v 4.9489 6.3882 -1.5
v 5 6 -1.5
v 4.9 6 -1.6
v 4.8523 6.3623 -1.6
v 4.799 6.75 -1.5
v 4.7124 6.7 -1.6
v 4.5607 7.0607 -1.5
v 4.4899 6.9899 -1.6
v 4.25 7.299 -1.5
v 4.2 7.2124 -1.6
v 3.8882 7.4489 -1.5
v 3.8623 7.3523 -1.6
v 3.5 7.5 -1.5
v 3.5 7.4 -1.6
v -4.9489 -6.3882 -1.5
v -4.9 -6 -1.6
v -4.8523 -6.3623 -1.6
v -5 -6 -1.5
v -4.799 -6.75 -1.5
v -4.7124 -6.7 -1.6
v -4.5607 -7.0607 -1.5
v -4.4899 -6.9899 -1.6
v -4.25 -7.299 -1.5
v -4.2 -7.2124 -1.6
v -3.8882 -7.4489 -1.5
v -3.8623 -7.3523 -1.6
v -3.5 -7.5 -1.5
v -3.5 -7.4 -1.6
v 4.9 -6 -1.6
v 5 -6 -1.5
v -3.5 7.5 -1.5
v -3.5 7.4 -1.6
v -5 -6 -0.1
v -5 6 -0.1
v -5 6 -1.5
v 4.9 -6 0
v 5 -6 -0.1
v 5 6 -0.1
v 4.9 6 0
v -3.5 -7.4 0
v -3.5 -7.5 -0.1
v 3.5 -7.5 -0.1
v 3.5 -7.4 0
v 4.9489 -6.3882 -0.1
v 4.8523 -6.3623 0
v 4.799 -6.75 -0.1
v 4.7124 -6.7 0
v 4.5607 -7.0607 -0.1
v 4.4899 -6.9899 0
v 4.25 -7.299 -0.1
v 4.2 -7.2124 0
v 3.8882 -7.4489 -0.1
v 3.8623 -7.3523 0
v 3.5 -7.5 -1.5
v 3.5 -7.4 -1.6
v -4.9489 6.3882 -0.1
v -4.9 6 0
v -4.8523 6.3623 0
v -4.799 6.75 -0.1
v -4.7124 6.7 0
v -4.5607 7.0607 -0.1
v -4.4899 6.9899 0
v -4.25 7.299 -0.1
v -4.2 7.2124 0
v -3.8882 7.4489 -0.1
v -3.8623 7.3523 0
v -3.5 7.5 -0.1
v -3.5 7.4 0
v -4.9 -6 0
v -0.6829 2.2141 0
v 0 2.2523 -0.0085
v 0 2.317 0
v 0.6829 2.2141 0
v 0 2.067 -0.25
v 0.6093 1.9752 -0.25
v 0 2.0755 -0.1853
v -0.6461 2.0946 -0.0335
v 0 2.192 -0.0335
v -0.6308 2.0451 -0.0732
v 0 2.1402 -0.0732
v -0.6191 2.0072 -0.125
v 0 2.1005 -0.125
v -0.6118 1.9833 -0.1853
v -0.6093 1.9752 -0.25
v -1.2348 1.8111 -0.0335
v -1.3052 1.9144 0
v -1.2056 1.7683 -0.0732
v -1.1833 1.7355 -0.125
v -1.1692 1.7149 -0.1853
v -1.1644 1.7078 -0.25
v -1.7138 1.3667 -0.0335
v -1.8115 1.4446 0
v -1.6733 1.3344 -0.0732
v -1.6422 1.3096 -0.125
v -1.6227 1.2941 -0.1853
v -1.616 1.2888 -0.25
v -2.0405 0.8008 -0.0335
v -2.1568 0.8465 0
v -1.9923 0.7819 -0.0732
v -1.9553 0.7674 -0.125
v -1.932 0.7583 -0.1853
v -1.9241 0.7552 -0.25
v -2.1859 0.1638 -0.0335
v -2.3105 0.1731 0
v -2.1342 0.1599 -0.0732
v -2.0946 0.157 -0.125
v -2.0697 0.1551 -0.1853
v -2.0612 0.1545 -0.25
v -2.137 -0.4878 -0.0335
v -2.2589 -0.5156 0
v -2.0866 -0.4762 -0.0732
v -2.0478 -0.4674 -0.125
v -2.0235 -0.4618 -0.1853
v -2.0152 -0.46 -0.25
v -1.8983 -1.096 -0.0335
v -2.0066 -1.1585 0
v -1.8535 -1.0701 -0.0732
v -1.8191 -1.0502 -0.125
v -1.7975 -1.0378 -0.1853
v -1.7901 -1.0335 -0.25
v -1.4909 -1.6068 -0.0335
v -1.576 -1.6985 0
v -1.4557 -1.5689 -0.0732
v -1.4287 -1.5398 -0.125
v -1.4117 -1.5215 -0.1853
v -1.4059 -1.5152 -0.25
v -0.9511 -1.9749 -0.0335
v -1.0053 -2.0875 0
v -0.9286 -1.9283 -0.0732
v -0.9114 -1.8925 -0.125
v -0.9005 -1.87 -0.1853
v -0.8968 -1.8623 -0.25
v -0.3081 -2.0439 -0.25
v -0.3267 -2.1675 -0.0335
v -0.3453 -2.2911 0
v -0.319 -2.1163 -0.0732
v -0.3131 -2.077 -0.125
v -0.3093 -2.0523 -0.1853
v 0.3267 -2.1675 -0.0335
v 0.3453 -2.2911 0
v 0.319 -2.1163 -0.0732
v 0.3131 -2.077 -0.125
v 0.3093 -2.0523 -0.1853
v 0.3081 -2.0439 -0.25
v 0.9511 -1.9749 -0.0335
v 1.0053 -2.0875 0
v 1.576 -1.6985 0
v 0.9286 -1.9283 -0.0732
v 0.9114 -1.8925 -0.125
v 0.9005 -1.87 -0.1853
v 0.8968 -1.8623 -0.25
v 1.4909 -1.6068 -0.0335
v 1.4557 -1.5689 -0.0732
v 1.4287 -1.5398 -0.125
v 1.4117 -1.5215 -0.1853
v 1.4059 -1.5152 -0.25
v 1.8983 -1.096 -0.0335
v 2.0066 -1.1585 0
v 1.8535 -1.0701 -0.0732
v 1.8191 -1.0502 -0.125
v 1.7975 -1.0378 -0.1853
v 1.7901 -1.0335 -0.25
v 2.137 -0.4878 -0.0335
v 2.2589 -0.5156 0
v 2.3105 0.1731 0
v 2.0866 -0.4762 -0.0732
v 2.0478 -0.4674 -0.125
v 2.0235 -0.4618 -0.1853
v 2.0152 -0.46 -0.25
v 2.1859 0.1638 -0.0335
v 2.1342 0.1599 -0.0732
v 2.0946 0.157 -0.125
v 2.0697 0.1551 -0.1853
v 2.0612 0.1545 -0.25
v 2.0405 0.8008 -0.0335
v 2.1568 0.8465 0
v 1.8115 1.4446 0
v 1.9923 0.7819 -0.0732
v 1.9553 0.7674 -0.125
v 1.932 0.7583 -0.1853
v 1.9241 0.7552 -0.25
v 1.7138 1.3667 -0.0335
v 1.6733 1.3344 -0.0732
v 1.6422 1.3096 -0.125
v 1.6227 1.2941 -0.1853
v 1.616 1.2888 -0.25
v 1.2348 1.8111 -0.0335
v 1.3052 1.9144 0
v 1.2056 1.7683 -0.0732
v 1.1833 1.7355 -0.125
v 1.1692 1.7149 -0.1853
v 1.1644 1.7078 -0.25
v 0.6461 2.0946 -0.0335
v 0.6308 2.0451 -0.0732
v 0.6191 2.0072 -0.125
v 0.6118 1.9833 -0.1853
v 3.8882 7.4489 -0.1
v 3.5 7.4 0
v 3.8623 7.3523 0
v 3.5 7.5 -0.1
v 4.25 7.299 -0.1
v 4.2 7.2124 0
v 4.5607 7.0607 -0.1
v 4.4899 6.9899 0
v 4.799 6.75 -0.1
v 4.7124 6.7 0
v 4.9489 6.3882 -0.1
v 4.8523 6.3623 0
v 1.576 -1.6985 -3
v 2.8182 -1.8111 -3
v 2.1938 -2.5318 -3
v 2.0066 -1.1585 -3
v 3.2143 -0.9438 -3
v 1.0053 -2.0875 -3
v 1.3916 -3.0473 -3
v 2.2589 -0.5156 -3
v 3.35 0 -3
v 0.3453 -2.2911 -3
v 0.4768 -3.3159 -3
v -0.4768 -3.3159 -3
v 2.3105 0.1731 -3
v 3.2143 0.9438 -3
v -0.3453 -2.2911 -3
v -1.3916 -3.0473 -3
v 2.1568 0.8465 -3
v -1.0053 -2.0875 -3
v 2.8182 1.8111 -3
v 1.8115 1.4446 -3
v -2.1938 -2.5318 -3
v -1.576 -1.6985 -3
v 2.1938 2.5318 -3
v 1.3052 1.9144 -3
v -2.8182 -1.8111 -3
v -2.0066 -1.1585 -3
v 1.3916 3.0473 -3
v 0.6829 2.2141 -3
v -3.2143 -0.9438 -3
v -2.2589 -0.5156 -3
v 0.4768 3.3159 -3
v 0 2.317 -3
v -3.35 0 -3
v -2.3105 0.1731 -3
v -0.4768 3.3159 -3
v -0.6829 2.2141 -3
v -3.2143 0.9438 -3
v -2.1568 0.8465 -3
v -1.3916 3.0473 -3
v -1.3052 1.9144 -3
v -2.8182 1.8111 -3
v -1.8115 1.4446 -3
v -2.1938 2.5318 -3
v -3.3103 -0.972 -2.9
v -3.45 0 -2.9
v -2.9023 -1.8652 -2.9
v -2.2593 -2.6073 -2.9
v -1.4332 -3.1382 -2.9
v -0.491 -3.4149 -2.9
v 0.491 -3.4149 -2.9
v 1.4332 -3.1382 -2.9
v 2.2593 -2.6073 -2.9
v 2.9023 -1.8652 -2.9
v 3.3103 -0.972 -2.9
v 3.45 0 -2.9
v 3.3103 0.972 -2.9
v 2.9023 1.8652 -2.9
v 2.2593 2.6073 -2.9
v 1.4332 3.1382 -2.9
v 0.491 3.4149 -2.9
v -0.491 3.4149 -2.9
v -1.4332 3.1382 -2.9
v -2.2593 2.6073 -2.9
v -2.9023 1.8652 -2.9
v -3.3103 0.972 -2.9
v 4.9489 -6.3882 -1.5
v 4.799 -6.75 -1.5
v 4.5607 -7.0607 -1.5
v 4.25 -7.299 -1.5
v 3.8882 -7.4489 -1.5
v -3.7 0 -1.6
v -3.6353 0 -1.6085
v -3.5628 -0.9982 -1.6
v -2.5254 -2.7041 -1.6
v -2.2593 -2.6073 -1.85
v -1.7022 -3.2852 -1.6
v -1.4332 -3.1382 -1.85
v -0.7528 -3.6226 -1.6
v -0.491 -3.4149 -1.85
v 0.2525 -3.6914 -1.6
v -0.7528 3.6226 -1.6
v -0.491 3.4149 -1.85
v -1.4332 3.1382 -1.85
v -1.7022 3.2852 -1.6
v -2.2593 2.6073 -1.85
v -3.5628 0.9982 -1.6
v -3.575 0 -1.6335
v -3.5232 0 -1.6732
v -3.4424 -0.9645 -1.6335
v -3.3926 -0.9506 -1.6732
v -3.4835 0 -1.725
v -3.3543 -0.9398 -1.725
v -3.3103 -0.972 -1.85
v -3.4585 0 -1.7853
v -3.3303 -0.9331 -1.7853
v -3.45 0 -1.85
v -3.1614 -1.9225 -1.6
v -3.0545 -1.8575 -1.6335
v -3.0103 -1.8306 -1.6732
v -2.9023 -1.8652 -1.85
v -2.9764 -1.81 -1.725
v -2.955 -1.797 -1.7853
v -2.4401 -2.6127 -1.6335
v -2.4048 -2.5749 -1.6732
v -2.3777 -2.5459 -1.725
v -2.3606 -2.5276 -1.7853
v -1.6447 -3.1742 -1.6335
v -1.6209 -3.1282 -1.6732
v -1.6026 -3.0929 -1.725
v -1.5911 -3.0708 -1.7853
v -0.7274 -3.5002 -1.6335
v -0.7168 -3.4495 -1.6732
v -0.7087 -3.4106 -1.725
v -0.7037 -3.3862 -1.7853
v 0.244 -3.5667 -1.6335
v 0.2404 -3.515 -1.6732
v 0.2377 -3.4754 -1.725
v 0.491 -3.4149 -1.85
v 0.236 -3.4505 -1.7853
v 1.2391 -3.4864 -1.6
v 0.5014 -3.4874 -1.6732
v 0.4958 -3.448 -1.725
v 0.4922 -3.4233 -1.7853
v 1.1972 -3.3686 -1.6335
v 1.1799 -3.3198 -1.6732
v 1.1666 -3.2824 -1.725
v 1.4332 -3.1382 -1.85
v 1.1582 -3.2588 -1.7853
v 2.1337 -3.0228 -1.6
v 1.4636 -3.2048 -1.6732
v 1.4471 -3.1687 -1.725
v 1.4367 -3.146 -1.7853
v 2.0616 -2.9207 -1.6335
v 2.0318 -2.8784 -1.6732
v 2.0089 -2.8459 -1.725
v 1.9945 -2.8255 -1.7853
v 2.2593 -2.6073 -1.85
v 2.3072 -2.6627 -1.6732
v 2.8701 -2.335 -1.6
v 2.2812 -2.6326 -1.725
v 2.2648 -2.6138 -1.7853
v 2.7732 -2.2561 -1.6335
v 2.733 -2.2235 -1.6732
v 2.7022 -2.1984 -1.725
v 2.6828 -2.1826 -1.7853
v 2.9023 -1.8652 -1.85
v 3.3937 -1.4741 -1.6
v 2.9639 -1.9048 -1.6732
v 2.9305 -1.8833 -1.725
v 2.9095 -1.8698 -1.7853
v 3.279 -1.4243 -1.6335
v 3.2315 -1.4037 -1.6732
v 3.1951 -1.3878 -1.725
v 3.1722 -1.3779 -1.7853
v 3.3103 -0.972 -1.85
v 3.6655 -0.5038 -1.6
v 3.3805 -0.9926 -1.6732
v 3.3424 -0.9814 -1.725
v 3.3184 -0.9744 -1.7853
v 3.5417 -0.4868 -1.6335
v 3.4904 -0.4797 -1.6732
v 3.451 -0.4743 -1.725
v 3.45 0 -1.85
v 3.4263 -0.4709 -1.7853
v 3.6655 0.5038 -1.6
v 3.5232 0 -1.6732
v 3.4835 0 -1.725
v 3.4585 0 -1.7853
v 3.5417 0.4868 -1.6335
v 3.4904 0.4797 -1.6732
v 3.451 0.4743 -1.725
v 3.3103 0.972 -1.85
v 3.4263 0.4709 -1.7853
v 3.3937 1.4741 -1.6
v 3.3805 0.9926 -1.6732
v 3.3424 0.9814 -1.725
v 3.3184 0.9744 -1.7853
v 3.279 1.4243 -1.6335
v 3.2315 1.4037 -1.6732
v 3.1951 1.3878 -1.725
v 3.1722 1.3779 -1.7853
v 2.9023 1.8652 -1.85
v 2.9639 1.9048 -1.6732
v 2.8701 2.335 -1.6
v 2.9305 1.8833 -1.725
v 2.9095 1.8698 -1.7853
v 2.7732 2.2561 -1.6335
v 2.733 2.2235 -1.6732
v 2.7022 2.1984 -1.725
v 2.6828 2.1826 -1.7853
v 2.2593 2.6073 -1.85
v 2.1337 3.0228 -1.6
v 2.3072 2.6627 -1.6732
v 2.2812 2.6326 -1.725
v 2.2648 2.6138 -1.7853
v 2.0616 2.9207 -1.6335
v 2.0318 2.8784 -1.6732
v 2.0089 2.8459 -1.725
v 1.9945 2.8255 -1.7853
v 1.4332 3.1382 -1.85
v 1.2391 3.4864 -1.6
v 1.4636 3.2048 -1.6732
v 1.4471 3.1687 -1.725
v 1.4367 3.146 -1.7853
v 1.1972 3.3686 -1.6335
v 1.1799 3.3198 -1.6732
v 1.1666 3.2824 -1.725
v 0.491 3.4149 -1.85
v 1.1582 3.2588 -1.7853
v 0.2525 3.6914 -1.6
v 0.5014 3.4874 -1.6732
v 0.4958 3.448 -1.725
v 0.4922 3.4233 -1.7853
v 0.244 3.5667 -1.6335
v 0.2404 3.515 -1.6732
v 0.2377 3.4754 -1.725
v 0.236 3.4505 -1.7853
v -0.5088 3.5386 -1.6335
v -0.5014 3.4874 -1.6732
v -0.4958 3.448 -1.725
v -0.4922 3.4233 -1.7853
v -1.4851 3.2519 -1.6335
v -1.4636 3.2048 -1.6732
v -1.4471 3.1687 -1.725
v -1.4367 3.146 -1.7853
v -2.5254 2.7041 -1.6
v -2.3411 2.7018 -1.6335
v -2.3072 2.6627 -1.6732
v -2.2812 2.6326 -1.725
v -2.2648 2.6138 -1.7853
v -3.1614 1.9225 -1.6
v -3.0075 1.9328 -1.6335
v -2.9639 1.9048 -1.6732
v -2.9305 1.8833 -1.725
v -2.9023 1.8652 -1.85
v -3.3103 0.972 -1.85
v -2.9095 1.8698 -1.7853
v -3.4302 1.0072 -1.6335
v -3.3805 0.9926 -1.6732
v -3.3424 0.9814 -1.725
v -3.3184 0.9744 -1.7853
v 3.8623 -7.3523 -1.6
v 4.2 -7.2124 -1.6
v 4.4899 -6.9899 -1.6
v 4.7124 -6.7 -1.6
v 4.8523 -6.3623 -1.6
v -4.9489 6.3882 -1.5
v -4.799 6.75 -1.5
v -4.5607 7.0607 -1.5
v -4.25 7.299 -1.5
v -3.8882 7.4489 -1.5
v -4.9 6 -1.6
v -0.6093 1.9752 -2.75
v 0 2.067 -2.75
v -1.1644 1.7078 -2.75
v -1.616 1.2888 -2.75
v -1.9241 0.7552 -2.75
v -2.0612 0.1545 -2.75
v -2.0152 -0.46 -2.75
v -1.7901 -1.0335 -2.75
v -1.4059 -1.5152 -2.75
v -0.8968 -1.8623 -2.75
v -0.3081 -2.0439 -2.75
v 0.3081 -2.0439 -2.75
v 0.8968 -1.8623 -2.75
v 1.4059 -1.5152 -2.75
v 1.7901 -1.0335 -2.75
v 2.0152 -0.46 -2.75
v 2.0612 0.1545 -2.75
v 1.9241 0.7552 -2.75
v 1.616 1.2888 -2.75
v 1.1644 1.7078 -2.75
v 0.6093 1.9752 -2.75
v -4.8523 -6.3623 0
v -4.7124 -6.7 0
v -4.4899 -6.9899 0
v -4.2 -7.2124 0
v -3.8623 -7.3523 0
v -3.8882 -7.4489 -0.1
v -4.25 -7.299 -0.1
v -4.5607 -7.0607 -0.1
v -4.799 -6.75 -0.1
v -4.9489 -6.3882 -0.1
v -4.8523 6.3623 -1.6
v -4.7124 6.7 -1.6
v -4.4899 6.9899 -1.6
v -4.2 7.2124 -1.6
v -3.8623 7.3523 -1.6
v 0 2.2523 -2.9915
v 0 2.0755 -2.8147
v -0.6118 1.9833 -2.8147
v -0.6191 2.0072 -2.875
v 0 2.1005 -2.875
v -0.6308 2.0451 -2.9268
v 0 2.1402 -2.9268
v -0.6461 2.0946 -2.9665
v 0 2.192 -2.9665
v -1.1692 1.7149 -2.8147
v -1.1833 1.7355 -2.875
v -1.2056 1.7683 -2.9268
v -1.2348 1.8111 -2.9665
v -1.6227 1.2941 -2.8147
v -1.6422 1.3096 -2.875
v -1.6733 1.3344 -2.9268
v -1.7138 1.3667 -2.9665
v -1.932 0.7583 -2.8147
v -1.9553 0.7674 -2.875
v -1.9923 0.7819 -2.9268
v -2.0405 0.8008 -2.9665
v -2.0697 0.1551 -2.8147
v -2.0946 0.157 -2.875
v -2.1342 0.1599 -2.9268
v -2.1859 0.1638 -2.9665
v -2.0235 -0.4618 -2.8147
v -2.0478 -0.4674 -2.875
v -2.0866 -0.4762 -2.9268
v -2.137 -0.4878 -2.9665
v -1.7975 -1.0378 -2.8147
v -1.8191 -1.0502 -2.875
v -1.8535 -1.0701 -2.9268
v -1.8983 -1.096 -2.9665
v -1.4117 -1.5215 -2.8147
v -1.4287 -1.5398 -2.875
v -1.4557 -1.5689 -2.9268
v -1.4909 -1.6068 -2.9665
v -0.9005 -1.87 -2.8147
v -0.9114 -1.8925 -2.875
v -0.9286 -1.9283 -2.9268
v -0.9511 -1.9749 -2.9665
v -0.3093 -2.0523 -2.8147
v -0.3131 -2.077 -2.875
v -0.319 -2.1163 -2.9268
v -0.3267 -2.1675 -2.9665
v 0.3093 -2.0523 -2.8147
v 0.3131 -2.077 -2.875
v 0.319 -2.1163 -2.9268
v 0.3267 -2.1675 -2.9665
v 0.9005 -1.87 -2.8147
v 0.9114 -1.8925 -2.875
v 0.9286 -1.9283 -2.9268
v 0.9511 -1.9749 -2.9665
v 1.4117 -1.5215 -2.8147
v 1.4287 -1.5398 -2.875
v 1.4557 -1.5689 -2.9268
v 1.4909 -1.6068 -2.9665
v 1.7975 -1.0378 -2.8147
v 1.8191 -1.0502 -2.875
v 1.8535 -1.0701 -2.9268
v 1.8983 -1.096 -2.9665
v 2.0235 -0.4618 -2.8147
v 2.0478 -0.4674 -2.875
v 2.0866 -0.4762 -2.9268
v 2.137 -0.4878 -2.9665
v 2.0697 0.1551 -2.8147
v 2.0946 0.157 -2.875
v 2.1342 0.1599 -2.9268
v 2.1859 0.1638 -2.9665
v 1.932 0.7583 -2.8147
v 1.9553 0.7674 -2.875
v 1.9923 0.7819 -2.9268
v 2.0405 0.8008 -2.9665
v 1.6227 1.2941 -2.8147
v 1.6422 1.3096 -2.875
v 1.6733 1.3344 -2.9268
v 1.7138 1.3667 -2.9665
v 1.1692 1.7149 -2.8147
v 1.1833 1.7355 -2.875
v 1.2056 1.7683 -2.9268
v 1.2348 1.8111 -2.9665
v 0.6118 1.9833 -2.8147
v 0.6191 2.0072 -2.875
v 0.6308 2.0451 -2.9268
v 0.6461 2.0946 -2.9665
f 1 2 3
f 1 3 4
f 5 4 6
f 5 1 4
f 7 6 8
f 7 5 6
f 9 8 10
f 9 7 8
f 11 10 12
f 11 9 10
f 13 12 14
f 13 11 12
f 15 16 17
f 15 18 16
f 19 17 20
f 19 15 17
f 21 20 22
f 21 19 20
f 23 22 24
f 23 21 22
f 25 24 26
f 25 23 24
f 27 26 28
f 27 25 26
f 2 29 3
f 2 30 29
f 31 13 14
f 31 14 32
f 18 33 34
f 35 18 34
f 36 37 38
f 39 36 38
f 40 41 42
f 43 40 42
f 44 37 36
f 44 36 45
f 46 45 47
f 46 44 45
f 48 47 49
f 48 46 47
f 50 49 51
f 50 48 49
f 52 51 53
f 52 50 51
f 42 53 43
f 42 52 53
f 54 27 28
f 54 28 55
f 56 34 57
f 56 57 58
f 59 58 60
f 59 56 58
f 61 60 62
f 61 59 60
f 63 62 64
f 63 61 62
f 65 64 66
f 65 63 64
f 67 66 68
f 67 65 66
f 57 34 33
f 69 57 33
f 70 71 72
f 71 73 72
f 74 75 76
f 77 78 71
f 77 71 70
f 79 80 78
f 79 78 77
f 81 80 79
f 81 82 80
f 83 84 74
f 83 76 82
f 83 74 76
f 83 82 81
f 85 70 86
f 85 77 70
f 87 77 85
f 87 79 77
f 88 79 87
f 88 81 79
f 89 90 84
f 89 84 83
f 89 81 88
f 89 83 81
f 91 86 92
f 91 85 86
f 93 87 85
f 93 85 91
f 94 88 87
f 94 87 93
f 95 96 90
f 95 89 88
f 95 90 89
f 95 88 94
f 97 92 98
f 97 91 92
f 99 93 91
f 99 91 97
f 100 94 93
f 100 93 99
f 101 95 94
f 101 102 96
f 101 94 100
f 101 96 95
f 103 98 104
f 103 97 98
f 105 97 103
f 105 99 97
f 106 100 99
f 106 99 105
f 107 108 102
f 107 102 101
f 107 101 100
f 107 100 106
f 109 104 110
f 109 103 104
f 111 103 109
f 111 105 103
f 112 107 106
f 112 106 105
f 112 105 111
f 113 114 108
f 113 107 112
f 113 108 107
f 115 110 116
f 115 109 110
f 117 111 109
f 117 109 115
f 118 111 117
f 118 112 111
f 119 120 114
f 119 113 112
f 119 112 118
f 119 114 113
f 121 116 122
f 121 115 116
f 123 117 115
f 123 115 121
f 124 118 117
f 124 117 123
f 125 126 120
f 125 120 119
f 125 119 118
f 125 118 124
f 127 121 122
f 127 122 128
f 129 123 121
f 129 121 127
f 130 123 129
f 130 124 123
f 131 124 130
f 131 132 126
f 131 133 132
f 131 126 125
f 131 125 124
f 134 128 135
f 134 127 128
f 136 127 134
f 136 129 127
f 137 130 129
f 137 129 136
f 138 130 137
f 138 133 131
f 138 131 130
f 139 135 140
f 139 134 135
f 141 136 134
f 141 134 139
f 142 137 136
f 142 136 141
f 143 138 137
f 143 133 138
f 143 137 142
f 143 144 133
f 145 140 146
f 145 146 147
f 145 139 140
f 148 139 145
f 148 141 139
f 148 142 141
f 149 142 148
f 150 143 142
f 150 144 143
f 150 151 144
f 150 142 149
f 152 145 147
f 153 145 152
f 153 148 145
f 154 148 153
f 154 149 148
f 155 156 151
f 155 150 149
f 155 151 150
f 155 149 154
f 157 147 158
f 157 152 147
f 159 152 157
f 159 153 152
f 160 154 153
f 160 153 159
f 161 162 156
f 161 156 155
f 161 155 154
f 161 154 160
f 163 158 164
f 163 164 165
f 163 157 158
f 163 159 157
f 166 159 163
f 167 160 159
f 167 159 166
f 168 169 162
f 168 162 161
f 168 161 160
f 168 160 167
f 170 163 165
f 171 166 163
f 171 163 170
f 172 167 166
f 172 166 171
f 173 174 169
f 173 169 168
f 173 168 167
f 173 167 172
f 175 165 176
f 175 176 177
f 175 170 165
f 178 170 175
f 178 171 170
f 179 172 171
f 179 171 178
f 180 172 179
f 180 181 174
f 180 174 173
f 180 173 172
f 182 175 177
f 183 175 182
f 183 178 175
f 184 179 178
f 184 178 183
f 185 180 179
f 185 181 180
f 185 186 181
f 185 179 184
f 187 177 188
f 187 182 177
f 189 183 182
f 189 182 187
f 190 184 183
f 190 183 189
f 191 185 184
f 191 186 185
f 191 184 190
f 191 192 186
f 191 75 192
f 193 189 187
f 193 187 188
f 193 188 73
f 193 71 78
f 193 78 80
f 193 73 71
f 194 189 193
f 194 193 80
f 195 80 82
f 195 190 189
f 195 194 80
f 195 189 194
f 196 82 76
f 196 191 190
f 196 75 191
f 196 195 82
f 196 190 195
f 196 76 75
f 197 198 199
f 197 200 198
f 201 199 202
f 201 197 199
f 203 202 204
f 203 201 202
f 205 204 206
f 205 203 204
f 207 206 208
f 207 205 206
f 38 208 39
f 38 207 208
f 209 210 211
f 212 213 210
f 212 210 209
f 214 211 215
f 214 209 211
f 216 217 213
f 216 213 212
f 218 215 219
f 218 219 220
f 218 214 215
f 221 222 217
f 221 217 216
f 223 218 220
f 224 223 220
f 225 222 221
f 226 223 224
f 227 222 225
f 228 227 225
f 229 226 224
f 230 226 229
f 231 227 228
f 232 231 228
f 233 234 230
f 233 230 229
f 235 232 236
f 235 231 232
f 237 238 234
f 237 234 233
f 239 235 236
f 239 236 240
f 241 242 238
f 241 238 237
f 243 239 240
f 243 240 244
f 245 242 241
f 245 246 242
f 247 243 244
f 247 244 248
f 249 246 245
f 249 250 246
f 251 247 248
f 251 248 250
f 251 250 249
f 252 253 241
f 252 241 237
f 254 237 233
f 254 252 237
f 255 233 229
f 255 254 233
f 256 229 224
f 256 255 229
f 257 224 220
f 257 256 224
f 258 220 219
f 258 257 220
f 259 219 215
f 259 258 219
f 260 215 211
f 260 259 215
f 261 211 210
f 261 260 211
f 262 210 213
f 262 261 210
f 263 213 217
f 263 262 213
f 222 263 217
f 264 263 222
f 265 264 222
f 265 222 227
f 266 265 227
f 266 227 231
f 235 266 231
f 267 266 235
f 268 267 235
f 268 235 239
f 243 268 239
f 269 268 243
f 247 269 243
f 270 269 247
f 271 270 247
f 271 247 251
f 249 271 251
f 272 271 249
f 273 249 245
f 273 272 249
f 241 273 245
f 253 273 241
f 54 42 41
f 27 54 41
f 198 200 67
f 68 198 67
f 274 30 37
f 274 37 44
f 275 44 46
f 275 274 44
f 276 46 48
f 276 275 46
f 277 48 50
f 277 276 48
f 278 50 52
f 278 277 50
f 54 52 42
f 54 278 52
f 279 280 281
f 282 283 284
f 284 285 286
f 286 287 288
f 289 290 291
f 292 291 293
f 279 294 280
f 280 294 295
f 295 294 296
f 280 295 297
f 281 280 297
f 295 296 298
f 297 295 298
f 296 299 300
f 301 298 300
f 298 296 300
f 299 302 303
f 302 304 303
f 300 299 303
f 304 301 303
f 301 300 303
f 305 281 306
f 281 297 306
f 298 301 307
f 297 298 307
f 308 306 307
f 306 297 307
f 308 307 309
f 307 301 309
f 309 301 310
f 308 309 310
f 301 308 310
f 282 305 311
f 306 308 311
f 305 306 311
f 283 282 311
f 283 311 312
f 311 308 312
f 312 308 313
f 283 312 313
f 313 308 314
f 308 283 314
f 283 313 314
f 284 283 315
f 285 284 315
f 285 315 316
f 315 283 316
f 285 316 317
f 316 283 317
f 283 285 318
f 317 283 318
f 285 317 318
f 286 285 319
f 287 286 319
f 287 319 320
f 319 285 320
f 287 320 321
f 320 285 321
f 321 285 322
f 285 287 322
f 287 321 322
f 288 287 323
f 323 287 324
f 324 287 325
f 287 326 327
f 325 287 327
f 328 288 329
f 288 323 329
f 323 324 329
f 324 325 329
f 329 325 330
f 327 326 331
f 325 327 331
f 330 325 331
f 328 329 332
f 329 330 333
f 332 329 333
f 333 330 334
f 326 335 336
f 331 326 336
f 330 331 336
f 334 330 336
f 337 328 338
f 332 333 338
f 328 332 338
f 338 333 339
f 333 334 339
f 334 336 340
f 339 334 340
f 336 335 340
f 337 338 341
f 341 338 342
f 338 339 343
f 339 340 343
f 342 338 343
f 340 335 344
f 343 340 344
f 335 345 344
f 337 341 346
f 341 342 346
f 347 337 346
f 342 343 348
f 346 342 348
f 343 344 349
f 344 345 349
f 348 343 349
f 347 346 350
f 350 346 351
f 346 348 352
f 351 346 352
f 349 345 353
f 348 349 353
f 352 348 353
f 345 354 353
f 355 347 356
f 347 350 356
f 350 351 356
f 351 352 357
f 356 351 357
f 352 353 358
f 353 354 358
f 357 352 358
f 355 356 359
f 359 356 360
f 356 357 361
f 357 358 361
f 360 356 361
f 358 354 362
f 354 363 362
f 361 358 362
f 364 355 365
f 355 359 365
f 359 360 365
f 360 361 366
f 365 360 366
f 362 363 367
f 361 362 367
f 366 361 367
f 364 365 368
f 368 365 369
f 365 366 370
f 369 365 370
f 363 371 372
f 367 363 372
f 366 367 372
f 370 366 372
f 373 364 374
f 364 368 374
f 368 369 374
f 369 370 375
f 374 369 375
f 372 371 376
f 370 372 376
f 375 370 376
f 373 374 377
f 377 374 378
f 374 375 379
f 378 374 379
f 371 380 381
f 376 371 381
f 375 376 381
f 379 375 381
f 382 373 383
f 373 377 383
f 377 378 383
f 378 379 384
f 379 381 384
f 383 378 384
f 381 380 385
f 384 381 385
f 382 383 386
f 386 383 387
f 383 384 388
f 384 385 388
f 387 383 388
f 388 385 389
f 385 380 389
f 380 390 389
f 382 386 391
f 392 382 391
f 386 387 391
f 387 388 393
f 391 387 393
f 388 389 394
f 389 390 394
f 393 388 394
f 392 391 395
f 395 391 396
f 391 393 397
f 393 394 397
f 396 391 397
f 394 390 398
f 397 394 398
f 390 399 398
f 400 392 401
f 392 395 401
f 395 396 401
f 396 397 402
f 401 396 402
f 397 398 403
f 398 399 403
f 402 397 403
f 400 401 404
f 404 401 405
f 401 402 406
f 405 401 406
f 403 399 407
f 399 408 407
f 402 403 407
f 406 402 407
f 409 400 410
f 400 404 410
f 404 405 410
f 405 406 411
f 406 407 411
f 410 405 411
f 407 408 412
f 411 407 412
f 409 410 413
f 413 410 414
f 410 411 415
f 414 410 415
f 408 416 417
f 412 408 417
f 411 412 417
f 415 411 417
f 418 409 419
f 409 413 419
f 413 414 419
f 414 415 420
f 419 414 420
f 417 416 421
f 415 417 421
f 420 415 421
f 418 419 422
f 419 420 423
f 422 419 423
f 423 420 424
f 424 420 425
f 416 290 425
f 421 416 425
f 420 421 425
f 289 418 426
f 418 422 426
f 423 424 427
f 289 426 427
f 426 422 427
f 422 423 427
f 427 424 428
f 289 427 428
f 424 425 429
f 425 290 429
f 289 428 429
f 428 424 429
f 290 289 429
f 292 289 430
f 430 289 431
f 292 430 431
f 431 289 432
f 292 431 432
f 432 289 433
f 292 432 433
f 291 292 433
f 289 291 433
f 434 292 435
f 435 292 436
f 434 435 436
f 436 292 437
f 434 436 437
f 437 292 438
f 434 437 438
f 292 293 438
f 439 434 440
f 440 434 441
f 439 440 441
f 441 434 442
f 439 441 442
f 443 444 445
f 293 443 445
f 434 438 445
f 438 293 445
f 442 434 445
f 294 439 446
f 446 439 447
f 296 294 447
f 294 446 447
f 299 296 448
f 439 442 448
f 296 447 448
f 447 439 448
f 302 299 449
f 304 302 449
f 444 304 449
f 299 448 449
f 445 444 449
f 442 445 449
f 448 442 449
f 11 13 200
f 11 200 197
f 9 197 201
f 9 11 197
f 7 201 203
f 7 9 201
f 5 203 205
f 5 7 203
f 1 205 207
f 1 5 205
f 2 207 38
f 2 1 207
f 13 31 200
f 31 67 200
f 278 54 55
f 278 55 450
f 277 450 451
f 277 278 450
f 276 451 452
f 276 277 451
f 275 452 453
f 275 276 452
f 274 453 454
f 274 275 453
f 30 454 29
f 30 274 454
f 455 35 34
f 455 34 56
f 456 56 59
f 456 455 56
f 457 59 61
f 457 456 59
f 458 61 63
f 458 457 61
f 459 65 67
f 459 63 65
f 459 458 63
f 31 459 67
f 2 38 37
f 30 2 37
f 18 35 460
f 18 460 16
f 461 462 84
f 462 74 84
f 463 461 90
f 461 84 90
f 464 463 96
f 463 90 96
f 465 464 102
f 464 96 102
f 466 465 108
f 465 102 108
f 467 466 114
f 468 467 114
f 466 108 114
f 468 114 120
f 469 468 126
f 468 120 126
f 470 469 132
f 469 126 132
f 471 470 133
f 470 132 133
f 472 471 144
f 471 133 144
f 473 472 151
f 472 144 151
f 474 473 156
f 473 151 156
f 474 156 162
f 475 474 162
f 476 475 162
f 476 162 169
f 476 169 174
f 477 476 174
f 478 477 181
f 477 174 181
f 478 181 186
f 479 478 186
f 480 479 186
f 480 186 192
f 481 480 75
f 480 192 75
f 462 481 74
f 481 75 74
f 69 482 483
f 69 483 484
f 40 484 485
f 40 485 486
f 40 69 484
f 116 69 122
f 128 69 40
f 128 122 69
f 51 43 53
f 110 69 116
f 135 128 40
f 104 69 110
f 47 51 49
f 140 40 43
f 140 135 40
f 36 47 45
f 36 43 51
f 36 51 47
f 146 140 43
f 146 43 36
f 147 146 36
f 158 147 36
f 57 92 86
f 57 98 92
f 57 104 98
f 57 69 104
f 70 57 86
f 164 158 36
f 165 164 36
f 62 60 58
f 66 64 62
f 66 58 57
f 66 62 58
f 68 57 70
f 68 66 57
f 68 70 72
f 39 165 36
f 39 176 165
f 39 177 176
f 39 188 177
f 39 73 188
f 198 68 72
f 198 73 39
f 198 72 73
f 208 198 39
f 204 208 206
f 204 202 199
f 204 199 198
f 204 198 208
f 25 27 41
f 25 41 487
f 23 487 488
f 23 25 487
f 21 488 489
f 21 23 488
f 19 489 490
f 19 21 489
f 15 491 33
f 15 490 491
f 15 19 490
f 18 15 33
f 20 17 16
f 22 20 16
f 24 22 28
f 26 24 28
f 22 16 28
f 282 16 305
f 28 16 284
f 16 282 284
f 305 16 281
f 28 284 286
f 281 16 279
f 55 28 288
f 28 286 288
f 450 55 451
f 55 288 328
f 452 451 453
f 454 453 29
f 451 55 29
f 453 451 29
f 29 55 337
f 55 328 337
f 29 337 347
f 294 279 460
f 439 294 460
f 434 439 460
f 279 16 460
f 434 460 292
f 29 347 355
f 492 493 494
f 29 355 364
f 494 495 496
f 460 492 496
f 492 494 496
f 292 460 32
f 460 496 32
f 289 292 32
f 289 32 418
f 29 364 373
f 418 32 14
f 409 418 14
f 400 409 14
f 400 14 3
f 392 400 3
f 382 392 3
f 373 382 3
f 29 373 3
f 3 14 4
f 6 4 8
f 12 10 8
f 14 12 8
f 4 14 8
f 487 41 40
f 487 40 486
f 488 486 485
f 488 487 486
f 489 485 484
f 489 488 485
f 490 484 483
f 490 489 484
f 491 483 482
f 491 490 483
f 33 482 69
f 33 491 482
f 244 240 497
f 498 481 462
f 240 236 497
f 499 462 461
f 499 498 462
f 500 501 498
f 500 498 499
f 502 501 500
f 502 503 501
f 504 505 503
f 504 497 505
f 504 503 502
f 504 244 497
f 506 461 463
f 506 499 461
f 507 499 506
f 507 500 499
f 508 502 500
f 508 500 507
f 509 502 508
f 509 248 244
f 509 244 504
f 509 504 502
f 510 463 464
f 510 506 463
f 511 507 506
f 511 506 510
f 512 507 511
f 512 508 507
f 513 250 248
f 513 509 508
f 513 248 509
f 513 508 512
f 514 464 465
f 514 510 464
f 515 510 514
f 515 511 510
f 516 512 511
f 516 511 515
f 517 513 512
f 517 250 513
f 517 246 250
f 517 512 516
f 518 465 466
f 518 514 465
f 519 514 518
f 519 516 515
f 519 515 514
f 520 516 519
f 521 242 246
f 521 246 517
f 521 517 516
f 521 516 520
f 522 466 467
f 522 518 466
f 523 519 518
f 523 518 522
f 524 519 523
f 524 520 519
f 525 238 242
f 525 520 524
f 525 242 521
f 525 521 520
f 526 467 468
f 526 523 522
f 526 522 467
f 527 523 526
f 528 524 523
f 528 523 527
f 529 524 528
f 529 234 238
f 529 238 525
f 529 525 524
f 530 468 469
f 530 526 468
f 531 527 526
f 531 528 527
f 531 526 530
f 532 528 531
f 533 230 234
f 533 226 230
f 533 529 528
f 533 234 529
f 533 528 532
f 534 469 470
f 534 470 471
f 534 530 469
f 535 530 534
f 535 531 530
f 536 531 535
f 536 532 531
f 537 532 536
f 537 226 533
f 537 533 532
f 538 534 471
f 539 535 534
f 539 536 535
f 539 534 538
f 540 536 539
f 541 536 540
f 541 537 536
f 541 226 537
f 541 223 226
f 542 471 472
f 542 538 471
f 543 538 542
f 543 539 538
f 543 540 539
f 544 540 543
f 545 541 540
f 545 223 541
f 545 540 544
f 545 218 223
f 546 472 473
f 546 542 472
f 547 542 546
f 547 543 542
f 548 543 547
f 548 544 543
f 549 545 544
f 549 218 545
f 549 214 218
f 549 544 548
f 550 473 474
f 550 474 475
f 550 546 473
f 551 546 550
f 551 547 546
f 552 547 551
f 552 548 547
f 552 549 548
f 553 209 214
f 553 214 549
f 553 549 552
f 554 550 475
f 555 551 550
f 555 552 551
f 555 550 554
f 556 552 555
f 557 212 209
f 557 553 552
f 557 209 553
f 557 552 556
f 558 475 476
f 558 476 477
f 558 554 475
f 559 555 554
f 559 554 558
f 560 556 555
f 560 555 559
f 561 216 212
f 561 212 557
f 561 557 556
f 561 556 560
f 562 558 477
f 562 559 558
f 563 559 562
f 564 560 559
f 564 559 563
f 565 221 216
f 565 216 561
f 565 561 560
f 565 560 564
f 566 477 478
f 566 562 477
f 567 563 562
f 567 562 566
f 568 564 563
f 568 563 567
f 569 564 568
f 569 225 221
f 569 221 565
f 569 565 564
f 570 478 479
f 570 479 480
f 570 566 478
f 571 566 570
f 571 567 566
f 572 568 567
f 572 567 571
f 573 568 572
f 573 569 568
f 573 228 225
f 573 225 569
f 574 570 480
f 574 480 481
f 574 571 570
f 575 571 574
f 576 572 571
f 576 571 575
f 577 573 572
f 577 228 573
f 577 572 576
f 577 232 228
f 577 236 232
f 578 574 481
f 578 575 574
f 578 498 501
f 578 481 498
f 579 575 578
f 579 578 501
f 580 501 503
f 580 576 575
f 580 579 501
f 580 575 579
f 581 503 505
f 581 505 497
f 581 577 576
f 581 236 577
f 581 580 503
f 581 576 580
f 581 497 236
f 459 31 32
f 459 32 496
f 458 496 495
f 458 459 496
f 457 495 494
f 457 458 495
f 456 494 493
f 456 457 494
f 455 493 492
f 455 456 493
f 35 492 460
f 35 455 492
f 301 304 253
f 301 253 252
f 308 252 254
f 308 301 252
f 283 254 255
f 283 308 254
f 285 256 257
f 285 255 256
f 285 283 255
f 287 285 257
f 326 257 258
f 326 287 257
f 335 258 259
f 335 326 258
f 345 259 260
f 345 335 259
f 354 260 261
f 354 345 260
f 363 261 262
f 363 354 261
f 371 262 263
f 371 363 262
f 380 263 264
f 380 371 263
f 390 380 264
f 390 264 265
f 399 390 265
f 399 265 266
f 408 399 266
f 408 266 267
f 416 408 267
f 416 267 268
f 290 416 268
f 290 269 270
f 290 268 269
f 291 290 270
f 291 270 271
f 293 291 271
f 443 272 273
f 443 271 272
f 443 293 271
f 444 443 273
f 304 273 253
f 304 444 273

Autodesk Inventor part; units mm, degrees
ref_plane "YZ Plane" through (0, 0, 0) normal (1, 0, 0) x (0, 1, 0)
ref_plane "XZ Plane" through (0, 0, 0) normal (0, 1, 0) x (-1, 0, 0)
ref_plane "XY Plane" through (0, 0, 0) normal (0, 0, 1) x (1, 0, 0)
sketch "Sketch1" plane through (0, 0, 0) normal (0, 0, 1) x (1, 0, 0)
  line L0 (5, -7.5) -> (-5, -7.5)
  line L1 (-5, -7.5) -> (-5, 7.5)
  line L2 (-5, 7.5) -> (5, 7.5)
  line L3 (5, 7.5) -> (5, -7.5)
  line L4 (5, -7.5) -> (-5, 7.5) construction
  line L5 (-5, -7.5) -> (5, 7.5) construction
  point P0 (0, 0)
  dimension "d0" = 10
  dimension "d1" = 15
extrude "Extrusion1" add sketch "Sketch1" against normal blind 1.6
sketch "Sketch2" plane through (0, 0, -1.6) normal (0, 0, -1) x (-1, 0, 0)
  circle A0 centre (0, 0) radius 3.45
  dimension "d4" = 6.9
extrude "Extrusion2" add sketch "Sketch2" along normal blind 1.4
fillet "Fillet1" radius 0.25 1 edges at (3.45, 0, -1.6)
fillet "Fillet2" radius 1.5 4 edges at (5, 7.5, -0.8) (-5, 7.5, -0.8) (-5, -7.5, -0.8) (5, -7.5, -0.8)
sketch "Sketch3" plane through (0, 0, -3) normal (0, 0, -1) x (-1, 0, 0)
  circle A0 centre (0, 0) radius 3.45 projected
hole "Hole1" at (0, 0, -3) direction (0, 0, 1) diameter 4.134 end through all thread size "M5x0.8" class "6H" standard "ANSI Metric M Profile"
fillet "Fillet3" radius 0.25 2 edges at (0, -2.067, 0) (0, -2.067, -3)
chamfer "Chamfer1" distance 0.1 angle 45 1 edges at (3.45, 0, -3)
chamfer "Chamfer2" distance 0.1 angle 45 16 edges at (4.5607, 7.0607, 0) (5, 0, 0) (4.5607, -7.0607, 0) (0, -7.5, 0) (-4.5607, -7.0607, 0) (-5, 0, 0) (-4.5607, 7.0607, 0) (0, 7.5, 0) (4.5607, 7.0607, -1.6) (0, 7.5, -1.6) (-4.5607, 7.0607, -1.6) (-5, 0, -1.6) (-4.5607, -7.0607, -1.6) (0, -7.5, -1.6) (4.5607, -7.0607, -1.6) (5, 0, -1.6)
properties part number "M5 T SLOT NUT"
